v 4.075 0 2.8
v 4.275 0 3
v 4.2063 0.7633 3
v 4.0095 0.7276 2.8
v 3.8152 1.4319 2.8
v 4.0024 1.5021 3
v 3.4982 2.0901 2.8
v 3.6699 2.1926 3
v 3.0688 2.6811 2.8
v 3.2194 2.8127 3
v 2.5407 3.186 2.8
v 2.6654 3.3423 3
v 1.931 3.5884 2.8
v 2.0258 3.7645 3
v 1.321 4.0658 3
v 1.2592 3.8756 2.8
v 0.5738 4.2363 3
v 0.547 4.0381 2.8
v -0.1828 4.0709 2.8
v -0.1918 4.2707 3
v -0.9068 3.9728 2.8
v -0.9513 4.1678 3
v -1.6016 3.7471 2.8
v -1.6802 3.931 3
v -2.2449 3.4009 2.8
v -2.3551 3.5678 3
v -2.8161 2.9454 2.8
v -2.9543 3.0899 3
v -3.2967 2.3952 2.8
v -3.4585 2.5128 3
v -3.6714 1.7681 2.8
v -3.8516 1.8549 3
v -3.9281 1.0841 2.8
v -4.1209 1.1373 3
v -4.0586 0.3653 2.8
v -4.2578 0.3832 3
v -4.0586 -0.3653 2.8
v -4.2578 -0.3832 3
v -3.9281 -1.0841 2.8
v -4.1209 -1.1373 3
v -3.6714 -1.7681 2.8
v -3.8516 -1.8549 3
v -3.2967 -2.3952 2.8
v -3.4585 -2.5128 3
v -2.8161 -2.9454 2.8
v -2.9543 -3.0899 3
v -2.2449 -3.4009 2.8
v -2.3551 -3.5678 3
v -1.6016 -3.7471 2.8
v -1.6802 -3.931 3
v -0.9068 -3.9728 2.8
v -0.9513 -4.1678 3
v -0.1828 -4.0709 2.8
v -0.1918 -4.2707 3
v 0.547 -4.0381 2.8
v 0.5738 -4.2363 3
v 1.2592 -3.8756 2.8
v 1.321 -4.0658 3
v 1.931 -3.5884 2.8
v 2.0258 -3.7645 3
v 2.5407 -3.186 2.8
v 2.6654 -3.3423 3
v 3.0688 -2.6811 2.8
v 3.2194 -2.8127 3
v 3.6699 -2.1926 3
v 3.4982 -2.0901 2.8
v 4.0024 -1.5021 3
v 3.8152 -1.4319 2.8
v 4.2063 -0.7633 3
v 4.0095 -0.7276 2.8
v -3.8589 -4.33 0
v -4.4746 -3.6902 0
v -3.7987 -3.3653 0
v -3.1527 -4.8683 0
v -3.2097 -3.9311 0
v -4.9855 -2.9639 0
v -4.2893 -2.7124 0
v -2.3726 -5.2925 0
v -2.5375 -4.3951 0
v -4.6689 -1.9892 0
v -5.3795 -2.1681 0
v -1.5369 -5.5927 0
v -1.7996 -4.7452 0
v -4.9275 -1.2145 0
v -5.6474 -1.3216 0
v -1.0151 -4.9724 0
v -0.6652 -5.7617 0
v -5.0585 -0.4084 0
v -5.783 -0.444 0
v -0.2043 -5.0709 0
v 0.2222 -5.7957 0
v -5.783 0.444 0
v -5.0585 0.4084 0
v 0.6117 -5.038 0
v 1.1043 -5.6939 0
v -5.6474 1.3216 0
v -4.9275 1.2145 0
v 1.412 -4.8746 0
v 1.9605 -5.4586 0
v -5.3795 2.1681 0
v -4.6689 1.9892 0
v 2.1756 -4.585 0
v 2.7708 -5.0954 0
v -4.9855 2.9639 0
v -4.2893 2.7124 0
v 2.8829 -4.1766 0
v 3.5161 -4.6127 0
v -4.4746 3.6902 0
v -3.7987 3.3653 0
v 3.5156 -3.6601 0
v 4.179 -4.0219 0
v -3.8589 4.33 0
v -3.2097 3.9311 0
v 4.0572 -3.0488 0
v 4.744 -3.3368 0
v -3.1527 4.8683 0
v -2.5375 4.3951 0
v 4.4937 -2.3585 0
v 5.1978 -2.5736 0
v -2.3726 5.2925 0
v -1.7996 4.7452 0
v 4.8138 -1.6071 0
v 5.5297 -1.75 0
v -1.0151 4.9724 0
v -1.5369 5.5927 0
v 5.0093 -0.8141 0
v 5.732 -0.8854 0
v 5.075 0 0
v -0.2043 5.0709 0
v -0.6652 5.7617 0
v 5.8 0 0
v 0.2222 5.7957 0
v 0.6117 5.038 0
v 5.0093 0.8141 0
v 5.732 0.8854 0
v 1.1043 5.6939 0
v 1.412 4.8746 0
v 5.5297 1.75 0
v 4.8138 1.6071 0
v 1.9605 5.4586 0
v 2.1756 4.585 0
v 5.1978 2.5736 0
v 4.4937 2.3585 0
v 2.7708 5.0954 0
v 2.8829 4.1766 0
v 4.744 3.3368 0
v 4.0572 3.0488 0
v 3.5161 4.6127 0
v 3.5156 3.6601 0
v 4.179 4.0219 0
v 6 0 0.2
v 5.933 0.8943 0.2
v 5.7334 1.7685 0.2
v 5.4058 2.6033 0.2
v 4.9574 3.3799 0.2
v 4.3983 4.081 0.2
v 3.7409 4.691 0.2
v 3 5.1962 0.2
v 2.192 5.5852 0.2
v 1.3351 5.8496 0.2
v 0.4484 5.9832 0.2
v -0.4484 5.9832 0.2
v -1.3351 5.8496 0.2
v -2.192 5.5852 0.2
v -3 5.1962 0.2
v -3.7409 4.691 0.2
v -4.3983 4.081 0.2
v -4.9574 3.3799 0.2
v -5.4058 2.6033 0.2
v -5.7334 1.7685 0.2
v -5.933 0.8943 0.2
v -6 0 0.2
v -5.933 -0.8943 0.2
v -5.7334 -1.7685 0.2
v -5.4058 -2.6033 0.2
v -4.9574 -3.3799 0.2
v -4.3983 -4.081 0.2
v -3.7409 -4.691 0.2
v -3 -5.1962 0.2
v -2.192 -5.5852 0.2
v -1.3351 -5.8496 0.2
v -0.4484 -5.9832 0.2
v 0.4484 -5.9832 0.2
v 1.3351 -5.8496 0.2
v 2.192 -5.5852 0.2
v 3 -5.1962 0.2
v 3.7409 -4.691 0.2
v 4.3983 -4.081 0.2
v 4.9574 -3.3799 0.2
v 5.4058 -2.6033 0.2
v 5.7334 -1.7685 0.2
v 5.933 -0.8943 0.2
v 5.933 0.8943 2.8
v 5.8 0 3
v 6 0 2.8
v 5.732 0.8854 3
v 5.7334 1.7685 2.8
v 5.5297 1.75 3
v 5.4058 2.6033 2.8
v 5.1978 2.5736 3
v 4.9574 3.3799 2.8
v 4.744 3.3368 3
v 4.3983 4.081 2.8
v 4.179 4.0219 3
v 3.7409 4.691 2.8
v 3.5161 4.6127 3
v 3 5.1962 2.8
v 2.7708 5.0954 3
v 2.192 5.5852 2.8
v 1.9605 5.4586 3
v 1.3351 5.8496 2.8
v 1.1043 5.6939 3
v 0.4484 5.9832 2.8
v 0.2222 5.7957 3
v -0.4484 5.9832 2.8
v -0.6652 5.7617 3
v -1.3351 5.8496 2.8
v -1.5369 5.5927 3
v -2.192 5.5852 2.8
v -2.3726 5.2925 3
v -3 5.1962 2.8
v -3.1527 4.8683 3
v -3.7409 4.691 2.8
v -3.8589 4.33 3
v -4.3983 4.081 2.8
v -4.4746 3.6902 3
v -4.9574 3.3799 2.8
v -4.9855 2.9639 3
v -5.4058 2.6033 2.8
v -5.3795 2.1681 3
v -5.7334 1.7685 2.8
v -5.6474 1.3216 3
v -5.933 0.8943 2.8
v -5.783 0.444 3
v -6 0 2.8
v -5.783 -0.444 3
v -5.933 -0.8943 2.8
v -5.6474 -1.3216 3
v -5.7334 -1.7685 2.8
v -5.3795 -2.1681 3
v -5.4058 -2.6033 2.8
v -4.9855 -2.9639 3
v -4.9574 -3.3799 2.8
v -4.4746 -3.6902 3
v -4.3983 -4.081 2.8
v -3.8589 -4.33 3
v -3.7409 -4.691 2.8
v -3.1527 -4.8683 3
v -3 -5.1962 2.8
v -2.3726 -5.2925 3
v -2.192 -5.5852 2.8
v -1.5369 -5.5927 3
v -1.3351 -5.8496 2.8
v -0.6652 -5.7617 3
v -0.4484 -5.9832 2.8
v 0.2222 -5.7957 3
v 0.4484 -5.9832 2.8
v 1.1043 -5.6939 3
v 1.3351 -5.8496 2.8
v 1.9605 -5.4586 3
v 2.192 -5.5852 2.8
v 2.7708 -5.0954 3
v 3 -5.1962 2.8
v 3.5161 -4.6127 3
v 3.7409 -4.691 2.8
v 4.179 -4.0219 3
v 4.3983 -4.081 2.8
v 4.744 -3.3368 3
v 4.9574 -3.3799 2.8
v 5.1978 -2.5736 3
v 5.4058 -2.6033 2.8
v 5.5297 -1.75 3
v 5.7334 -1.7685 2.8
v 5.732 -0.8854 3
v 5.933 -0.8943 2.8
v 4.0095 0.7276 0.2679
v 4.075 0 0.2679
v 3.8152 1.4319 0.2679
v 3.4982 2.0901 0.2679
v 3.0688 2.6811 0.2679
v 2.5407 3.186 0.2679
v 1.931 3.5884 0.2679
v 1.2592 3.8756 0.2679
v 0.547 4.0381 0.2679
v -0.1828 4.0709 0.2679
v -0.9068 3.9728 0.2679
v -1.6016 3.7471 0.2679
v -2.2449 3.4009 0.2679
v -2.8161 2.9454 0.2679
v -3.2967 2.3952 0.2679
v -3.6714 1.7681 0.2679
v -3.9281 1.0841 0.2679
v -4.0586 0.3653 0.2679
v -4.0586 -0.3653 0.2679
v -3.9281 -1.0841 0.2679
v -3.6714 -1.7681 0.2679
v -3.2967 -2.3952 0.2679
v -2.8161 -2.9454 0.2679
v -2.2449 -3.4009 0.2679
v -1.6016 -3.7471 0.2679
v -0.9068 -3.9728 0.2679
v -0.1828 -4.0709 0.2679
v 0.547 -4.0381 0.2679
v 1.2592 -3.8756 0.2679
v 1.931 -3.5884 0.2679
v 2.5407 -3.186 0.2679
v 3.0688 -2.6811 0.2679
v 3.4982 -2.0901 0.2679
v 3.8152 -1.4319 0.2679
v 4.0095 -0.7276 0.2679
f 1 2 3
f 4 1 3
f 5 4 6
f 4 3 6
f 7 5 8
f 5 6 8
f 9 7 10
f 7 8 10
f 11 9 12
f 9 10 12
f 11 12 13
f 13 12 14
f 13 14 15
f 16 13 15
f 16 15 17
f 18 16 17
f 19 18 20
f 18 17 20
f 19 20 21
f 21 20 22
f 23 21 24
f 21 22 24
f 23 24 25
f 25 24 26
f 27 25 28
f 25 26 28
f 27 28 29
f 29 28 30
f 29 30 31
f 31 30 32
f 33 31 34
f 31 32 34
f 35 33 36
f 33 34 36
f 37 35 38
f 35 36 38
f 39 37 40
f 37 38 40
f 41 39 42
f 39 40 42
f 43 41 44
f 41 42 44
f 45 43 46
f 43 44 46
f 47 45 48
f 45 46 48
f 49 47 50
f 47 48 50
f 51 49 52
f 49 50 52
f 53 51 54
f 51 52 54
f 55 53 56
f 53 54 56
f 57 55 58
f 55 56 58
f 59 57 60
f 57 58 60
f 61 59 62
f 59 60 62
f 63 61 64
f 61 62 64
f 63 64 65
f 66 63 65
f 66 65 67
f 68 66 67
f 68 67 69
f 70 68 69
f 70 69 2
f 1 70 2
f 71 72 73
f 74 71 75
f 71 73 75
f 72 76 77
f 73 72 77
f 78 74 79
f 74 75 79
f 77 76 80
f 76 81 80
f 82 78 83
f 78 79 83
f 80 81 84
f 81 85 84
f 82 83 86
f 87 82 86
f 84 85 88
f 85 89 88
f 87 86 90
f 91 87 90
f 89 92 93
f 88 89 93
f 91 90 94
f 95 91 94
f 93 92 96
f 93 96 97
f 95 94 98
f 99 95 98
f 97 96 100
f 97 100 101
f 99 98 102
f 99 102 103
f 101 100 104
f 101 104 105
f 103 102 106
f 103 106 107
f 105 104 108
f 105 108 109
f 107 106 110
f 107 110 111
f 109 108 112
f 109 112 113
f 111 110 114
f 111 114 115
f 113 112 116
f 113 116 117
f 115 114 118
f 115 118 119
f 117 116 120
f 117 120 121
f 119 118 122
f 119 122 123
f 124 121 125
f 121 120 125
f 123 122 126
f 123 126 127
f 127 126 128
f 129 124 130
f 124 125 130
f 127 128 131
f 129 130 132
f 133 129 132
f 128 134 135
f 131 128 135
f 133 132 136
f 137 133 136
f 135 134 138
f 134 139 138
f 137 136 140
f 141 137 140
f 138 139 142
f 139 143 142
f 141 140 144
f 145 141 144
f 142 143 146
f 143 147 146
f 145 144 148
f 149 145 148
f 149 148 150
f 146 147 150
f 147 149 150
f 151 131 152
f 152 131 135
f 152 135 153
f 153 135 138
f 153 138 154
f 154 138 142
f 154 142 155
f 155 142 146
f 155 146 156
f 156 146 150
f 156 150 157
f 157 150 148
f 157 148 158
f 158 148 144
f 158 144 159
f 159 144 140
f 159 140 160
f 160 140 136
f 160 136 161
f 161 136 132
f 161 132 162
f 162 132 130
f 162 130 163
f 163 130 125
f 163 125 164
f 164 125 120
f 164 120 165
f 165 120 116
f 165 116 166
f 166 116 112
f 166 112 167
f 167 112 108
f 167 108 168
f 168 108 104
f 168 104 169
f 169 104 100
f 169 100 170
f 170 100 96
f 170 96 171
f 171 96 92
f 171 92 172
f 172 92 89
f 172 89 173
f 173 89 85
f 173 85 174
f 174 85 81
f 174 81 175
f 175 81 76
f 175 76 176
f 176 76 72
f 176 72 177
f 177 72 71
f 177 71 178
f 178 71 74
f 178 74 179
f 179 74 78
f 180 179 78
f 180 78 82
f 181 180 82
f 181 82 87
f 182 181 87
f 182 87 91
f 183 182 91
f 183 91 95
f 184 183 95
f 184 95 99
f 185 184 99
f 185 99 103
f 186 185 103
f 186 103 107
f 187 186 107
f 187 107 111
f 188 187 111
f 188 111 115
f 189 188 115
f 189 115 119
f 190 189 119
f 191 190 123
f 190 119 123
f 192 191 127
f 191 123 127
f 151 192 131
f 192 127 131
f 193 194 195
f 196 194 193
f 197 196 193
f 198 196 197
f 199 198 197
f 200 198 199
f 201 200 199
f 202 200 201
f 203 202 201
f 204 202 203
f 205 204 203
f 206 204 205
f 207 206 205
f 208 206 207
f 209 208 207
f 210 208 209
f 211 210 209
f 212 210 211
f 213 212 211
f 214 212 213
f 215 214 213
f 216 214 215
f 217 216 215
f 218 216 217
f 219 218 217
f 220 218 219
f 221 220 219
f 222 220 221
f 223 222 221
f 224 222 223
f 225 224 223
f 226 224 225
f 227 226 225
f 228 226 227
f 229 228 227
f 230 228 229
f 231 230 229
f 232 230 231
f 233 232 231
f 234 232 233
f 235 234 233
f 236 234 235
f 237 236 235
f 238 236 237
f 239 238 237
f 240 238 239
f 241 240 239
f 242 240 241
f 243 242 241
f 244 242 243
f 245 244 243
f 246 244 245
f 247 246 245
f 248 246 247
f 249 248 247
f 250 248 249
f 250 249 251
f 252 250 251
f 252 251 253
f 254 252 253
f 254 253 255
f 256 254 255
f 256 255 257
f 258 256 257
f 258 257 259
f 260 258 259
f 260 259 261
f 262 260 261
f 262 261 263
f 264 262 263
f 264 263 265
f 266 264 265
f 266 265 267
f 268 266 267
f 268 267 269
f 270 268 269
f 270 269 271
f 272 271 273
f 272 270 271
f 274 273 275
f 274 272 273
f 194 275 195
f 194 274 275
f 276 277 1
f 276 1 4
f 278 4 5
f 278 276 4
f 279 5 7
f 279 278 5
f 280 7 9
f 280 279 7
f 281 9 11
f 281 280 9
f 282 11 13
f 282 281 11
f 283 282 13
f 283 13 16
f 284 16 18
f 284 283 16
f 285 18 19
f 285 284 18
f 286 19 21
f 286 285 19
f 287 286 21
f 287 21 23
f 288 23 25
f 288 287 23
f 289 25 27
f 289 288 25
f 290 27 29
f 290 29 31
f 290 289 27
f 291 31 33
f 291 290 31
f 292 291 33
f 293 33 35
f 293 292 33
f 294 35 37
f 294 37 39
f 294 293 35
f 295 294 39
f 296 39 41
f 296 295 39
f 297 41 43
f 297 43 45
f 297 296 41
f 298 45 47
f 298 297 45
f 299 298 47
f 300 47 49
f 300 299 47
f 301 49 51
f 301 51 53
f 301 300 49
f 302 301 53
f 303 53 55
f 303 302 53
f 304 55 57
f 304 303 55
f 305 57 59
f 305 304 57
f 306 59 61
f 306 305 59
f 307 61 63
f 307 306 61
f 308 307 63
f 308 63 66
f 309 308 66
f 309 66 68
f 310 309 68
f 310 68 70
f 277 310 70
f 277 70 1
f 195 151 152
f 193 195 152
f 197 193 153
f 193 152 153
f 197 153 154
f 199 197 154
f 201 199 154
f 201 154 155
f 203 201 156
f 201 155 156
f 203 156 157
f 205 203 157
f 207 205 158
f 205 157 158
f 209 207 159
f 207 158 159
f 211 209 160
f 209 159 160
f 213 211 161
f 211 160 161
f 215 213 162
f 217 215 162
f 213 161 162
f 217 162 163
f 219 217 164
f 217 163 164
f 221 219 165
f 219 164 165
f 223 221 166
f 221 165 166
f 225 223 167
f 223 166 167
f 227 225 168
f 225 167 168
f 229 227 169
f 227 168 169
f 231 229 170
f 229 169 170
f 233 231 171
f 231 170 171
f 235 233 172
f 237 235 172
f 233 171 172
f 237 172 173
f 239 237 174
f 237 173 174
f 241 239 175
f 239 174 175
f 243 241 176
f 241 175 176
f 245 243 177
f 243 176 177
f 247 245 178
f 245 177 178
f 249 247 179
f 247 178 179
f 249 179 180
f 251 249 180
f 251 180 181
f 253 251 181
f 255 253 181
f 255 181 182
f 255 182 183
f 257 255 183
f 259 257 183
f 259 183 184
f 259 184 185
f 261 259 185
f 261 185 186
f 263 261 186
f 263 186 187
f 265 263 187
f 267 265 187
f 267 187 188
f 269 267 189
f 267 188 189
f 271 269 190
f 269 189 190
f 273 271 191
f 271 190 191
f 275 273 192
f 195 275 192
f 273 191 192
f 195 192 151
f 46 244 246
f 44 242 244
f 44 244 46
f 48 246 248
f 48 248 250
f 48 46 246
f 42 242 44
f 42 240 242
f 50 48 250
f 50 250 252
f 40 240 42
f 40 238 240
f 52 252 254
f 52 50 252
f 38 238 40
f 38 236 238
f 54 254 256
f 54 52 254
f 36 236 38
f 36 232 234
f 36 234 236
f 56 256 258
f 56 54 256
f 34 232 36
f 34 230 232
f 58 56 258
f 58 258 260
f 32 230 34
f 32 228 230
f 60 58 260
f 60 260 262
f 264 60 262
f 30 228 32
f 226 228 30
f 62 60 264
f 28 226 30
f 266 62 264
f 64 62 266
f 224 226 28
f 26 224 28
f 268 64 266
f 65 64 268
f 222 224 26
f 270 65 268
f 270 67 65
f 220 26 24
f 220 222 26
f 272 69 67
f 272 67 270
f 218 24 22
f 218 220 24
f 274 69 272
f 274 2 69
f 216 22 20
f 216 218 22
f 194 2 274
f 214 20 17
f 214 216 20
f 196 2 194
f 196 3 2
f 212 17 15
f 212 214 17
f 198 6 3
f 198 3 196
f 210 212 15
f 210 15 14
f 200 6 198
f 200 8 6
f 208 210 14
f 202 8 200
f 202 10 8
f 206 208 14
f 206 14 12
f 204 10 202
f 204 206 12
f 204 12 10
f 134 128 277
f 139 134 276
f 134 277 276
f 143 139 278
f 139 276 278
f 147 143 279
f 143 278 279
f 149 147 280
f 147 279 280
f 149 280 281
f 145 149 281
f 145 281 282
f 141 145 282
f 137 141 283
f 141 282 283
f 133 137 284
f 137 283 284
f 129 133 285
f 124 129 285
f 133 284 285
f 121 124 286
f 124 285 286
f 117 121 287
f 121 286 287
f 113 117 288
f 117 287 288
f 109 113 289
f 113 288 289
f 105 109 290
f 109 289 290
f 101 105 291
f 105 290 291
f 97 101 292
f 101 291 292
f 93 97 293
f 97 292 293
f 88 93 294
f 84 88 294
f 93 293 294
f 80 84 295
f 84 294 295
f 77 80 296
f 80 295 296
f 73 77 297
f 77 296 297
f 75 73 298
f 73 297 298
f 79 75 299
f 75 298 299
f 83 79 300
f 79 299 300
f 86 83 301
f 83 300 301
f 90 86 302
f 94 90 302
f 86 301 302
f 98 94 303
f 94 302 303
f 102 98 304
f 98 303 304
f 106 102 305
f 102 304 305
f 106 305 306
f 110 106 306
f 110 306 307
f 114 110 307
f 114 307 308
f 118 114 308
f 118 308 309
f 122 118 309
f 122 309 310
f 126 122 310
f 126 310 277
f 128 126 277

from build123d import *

# Parameters (mm, degrees)
F0_R     = 6
F0_R_2   = 4.075
F1_DEPTH = 3
F2_SIZE  = 0.2
F3_SIZE2 = 0.267949
F3_SIZE  = 1


with BuildPart() as f1:
    # F0 (on Top) → F1 (new body)
    with BuildSketch(Plane.XY):
        Circle(F0_R)
        Circle(F0_R_2, mode=Mode.SUBTRACT)
    extrude(amount=F1_DEPTH)

    # F2
    f2_edges = [f1.edges().sort_by_distance(p)[0] for p in [
        (-4.075, 0, 3),
        (-6, 0, 0),
        (-6, 0, 3),
    ]]
    chamfer(f2_edges, length=F2_SIZE)

    # F3
    f3_edges = [f1.edges().sort_by_distance(p)[0] for p in [
        (-4.075, 0, 0),
    ]]
    chamfer(f3_edges, length=F3_SIZE, length2=F3_SIZE2)


solid = f1.part
